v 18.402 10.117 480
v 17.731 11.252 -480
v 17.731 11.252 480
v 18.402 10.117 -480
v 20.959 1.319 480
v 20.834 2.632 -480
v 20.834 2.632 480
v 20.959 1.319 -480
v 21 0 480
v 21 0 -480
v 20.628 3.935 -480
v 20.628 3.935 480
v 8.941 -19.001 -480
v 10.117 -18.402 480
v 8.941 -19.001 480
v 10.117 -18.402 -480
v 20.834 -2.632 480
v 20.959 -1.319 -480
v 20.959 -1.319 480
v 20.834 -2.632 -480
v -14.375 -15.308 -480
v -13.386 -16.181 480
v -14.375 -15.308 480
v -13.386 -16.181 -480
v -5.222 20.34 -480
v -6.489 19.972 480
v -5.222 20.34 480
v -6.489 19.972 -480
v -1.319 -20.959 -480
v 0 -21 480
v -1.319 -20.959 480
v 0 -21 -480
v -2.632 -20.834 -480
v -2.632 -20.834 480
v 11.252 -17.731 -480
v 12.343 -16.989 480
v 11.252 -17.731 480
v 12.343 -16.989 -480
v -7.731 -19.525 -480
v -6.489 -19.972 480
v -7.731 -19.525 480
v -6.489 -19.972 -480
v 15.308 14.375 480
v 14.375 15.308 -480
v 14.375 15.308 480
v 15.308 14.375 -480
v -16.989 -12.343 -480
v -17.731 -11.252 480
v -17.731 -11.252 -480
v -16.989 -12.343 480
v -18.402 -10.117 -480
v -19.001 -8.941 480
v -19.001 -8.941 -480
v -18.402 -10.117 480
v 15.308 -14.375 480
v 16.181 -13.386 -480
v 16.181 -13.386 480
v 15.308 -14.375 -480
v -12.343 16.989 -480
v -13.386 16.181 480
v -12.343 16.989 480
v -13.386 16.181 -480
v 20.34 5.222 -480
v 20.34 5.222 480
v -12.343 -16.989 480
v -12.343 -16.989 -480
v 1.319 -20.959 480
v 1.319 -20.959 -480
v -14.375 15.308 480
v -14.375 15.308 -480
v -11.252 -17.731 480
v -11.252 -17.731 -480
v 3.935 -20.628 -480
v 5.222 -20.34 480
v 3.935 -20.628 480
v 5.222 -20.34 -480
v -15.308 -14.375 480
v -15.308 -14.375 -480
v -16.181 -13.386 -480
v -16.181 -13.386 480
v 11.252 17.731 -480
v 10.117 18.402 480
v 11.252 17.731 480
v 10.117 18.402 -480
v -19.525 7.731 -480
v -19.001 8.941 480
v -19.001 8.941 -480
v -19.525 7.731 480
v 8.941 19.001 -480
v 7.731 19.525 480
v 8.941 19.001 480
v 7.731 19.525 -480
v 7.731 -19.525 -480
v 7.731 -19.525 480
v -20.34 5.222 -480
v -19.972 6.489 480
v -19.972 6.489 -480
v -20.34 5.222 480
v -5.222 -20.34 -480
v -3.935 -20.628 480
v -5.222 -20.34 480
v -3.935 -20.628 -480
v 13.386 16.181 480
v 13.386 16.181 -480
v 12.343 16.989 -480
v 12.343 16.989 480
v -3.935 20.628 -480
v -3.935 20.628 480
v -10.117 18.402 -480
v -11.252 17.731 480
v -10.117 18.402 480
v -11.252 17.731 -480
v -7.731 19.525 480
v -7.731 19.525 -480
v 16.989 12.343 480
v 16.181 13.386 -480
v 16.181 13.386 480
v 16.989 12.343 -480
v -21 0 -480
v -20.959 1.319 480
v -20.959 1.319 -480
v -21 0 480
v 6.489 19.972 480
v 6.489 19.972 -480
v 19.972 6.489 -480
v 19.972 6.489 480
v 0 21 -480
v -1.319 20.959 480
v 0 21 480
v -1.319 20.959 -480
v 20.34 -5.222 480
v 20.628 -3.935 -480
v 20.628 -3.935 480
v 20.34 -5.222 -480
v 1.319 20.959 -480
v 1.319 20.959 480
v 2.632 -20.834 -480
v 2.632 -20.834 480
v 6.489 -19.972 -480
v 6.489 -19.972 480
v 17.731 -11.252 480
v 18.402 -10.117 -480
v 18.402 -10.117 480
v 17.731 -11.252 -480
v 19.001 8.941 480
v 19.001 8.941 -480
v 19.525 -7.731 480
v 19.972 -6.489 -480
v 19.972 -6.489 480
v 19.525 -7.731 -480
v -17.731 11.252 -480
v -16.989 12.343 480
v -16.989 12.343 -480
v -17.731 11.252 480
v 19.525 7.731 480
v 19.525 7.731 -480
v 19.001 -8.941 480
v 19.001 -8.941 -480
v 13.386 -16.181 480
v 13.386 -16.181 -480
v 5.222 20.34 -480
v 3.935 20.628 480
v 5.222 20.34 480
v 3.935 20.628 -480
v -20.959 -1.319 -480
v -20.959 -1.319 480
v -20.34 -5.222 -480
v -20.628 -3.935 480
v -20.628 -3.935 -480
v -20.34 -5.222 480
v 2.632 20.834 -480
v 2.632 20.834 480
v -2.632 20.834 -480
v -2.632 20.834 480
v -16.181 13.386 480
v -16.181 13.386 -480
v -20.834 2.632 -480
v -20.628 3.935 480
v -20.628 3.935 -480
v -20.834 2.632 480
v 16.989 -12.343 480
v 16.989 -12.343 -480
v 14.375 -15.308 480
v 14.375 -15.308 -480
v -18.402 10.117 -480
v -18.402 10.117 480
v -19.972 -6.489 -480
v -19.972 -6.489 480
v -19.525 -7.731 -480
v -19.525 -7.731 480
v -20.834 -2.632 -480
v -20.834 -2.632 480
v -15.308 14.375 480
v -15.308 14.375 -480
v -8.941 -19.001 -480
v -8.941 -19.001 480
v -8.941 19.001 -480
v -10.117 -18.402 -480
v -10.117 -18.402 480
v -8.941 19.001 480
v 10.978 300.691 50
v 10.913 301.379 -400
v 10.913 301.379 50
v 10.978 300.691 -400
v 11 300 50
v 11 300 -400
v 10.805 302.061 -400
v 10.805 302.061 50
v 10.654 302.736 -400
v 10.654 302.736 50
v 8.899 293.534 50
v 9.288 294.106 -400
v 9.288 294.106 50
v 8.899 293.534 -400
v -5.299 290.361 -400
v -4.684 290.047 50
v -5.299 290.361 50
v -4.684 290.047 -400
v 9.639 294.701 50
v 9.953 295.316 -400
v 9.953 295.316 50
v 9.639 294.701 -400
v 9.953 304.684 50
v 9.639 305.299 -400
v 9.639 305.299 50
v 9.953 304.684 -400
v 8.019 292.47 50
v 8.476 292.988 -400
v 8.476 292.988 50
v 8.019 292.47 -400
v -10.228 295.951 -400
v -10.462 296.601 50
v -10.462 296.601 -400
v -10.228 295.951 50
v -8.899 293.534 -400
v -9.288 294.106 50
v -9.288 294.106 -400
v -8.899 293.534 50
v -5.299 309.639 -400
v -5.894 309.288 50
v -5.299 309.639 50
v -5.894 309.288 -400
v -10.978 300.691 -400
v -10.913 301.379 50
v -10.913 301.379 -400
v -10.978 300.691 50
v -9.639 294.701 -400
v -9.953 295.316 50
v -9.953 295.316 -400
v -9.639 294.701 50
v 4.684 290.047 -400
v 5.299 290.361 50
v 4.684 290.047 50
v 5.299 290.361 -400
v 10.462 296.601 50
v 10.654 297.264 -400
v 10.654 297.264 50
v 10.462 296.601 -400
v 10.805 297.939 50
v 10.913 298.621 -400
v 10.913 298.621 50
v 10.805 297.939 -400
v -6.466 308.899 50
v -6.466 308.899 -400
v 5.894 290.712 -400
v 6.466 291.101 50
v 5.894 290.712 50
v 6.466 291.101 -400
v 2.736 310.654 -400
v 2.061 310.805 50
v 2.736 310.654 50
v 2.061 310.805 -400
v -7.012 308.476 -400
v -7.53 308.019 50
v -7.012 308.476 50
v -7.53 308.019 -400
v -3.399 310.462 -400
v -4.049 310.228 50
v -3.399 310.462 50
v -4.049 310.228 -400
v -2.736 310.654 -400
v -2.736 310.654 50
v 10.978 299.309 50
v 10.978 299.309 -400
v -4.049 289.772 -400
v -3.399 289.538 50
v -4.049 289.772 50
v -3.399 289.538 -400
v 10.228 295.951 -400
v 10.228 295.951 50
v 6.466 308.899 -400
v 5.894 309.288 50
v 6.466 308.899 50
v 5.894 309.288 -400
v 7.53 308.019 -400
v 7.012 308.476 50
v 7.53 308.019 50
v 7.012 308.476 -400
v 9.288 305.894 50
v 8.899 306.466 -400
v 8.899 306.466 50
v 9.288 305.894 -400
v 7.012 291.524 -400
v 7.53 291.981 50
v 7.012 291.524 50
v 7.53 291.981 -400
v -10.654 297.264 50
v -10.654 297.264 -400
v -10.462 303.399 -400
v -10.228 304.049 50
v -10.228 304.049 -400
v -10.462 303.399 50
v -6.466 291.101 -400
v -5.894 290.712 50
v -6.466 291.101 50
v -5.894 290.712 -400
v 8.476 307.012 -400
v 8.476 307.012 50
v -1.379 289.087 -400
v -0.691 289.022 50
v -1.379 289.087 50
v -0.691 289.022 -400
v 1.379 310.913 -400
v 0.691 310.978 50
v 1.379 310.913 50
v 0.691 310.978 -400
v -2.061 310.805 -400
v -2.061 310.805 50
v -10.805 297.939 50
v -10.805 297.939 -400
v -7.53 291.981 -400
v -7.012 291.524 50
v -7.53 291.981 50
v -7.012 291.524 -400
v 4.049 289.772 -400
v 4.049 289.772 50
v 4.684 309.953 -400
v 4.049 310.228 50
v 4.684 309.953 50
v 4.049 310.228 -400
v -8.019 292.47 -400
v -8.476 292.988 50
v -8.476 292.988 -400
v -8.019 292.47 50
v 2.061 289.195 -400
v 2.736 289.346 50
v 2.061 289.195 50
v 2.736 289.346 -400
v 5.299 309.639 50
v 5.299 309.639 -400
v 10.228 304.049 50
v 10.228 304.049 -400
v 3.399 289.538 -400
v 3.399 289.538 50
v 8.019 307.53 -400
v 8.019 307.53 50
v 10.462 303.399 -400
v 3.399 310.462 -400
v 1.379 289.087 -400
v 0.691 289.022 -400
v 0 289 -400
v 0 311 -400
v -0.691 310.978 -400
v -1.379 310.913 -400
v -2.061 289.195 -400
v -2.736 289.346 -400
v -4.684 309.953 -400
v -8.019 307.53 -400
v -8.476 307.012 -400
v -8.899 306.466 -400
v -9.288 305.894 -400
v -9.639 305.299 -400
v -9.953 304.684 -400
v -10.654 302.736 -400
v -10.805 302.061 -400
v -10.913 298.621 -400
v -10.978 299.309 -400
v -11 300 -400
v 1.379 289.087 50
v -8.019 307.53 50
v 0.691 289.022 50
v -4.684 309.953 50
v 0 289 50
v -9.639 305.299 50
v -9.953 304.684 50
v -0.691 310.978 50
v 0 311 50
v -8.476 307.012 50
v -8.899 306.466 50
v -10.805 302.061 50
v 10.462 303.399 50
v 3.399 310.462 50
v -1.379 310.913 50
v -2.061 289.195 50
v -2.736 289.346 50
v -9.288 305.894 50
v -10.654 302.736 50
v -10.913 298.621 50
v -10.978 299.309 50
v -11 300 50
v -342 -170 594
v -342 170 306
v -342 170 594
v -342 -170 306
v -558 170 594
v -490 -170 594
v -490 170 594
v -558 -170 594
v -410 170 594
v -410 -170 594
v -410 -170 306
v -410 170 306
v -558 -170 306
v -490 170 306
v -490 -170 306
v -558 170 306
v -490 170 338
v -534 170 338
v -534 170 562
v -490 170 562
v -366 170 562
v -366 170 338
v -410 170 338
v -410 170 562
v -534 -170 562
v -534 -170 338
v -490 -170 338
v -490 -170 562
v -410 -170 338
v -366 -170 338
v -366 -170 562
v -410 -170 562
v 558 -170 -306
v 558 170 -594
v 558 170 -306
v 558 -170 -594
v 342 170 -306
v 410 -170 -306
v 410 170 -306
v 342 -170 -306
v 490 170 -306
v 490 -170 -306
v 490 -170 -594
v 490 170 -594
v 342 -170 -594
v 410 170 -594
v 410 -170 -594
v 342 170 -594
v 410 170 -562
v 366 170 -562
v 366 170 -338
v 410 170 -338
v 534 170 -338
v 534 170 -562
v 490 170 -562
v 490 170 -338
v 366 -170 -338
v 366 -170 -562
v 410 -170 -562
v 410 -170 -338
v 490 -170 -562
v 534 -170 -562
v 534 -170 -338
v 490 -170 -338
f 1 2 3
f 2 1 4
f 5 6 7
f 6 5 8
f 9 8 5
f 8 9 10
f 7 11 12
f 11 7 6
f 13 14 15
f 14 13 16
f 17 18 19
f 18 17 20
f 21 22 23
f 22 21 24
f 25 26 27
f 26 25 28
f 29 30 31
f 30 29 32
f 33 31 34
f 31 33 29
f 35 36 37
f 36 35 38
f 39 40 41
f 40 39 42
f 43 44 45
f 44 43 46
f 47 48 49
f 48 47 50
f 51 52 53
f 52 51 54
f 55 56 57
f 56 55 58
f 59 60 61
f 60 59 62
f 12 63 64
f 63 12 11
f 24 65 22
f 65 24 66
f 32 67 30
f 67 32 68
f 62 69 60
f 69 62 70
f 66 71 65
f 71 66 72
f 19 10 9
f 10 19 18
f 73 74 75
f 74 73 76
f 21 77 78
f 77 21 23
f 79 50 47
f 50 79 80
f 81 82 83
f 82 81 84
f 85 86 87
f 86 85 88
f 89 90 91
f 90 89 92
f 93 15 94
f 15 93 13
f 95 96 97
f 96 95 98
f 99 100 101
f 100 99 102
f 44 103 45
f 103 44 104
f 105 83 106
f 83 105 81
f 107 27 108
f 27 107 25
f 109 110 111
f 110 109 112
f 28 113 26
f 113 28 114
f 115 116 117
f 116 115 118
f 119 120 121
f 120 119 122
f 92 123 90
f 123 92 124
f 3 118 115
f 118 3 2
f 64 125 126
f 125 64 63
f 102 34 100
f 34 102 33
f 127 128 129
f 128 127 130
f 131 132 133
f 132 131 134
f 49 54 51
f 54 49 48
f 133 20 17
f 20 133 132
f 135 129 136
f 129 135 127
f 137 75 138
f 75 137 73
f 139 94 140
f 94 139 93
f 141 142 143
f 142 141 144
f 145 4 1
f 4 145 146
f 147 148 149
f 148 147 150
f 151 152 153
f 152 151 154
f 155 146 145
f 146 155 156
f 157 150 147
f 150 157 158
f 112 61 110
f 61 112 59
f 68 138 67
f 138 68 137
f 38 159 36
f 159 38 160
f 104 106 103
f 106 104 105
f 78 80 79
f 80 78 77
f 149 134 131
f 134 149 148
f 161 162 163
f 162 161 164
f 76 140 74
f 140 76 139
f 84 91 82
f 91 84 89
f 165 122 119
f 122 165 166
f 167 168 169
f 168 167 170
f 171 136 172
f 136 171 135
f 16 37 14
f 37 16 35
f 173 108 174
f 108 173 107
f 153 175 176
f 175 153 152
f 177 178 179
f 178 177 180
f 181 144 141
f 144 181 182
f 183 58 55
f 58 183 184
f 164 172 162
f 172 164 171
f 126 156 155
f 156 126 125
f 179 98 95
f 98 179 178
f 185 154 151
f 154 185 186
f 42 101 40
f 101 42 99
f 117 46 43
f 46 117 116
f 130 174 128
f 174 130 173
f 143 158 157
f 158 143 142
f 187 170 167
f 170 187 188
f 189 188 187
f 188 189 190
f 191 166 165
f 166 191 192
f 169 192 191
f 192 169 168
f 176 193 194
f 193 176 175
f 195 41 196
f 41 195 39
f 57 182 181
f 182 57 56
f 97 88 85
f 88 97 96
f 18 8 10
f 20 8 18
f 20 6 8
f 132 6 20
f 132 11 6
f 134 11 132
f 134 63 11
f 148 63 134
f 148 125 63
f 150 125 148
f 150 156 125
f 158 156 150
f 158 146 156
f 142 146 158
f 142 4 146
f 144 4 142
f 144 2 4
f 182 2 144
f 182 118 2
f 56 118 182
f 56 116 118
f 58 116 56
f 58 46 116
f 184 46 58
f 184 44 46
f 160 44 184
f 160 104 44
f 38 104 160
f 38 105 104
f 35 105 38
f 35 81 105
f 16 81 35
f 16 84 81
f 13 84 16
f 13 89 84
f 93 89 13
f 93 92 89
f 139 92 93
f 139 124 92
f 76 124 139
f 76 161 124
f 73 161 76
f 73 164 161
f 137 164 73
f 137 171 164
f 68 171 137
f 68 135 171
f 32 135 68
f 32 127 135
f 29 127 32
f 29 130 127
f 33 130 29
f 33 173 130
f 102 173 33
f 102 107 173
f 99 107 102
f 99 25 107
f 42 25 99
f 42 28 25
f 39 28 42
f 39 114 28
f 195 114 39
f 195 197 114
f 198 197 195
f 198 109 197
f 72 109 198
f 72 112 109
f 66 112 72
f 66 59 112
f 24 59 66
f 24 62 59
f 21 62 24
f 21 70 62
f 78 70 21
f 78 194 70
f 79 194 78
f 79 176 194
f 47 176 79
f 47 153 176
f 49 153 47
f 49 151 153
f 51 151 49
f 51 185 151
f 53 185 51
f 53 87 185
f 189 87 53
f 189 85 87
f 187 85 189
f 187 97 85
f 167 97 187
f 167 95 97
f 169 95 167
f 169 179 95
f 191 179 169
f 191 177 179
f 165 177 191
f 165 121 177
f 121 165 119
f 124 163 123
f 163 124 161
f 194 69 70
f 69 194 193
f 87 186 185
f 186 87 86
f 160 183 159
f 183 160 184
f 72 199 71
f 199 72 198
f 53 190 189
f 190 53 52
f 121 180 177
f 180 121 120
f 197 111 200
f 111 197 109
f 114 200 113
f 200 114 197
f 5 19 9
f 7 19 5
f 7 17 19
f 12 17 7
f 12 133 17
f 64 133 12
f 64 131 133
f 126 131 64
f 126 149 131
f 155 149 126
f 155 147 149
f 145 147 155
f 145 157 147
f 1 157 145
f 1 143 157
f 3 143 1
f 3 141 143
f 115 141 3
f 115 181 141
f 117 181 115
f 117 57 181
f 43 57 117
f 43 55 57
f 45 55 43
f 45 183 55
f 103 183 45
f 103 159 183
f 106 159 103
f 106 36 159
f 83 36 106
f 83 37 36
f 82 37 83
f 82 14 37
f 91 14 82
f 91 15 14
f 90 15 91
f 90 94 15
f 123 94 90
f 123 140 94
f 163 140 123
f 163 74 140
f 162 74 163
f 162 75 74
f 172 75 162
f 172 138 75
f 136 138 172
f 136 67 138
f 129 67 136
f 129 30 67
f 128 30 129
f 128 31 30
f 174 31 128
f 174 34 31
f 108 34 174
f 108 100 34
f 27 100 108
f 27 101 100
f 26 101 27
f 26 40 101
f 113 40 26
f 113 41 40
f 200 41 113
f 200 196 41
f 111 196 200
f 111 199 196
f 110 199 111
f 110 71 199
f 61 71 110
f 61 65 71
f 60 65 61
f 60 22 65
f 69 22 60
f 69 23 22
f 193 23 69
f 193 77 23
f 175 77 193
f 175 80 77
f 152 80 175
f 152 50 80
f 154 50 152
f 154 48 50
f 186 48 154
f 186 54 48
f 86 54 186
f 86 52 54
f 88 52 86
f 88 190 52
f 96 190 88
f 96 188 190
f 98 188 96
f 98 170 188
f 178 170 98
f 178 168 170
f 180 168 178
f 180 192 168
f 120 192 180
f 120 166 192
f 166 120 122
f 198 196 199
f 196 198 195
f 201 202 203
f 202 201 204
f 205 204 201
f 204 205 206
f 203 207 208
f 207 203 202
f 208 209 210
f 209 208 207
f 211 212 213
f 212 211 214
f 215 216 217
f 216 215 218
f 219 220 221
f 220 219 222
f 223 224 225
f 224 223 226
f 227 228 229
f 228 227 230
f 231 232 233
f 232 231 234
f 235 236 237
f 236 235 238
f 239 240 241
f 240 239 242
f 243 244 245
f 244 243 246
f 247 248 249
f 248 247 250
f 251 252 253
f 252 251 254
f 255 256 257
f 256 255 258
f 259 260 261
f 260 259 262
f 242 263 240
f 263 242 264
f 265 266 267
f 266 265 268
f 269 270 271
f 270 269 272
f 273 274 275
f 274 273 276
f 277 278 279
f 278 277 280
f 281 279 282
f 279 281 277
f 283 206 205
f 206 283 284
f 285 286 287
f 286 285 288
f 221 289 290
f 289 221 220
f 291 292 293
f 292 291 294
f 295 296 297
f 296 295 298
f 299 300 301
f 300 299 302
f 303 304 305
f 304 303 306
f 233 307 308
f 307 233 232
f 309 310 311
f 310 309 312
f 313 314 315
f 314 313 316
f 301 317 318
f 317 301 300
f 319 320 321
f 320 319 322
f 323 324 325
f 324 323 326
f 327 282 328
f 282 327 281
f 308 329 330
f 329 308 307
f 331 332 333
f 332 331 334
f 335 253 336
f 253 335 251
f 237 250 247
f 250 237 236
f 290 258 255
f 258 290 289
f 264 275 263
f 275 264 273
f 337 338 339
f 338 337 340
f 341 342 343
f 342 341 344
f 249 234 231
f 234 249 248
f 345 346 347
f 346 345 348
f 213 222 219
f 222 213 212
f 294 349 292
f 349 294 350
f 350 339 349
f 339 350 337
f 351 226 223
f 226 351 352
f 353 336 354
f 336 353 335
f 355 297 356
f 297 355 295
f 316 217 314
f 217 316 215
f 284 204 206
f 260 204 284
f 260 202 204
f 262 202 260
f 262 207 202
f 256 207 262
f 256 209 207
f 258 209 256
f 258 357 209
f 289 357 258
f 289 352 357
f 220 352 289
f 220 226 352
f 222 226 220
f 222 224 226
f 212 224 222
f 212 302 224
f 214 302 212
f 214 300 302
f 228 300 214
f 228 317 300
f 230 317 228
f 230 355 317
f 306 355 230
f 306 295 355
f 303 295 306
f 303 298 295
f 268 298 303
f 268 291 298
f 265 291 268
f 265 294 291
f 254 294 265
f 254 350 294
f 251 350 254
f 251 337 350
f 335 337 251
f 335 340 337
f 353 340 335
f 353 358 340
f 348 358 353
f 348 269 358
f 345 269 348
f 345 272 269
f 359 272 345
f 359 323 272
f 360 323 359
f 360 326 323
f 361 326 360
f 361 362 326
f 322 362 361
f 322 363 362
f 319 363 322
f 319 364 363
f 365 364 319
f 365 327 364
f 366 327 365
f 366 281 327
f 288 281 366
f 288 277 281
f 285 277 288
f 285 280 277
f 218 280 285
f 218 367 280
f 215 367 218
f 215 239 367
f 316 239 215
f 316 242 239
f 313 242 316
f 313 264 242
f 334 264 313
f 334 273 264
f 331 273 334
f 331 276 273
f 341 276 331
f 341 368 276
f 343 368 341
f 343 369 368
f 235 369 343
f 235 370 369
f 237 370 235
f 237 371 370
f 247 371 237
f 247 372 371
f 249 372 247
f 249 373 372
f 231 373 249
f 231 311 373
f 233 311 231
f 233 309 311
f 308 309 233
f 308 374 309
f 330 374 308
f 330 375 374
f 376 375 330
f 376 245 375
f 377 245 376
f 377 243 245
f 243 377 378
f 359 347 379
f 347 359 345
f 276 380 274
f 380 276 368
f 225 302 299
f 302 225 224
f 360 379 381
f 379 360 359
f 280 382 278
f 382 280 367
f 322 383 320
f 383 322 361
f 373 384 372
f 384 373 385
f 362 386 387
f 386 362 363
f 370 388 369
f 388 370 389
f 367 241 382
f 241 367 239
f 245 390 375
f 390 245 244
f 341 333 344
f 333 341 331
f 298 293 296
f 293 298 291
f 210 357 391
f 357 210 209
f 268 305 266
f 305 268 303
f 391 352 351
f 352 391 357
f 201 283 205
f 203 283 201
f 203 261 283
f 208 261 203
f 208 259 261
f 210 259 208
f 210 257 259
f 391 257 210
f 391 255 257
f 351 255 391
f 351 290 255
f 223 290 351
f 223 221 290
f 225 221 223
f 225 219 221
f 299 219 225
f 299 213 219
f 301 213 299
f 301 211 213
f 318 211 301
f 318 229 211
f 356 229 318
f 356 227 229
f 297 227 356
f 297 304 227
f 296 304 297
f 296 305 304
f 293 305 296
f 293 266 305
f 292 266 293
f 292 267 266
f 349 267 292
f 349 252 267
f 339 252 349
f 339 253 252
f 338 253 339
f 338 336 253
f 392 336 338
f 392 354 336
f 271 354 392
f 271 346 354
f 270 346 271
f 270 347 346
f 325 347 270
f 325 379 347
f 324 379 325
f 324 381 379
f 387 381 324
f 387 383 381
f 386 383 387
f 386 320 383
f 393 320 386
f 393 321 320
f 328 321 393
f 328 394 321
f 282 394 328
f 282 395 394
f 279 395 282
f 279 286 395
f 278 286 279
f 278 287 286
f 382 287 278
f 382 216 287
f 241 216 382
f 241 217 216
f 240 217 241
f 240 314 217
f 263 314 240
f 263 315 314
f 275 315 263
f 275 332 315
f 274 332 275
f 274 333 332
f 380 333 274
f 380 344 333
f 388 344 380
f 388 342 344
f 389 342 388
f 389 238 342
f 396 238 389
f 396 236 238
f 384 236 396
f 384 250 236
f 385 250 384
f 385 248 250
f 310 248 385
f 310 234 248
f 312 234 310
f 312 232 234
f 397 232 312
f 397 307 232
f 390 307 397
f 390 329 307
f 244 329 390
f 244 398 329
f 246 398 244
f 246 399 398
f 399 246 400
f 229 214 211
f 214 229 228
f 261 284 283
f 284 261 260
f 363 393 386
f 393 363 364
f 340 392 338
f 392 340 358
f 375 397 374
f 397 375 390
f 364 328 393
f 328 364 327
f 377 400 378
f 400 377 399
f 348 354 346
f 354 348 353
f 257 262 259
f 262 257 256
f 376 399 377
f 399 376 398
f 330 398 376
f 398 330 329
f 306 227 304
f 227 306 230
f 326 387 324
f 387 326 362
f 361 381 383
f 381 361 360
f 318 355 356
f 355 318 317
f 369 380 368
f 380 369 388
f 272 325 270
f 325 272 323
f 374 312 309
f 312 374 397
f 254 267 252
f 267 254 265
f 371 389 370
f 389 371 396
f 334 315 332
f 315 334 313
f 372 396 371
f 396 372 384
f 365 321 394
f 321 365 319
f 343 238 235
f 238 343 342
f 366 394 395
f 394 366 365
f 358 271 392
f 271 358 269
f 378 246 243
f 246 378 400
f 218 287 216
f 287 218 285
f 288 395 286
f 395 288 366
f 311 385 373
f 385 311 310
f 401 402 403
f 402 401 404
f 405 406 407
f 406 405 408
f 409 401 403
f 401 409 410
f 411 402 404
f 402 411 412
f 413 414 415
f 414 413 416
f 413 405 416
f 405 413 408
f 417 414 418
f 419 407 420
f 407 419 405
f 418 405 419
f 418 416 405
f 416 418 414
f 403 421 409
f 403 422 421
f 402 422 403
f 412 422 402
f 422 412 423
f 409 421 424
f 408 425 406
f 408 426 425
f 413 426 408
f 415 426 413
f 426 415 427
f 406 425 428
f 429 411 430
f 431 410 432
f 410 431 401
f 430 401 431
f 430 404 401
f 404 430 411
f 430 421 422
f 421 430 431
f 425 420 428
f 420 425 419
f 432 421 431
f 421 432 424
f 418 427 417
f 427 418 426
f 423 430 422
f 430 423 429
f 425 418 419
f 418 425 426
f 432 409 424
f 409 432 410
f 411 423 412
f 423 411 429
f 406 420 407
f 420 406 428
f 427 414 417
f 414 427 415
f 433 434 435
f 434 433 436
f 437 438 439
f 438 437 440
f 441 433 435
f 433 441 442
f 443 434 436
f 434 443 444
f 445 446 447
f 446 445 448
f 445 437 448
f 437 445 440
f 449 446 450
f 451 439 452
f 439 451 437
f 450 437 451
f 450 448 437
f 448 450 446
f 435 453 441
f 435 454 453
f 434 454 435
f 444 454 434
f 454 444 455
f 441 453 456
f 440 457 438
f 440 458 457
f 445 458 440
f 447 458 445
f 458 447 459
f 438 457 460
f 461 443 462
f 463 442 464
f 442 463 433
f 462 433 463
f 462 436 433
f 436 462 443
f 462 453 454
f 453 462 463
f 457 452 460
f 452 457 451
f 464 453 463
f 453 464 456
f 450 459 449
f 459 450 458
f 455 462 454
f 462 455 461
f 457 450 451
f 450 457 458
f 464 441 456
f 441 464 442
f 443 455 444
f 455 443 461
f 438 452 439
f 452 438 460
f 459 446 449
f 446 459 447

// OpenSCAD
// ============================================================================
// PROJECT: XXXG-00W0 WING GUNDAM ZERO EW - WEAPON COMBINATION INFRA
// COMPONENT VAULT: BANDAI CAST RUNNER D - BARREL CLAMPS D5 & D6
// PACKAGING RE-ARCHITECTURE: SUB-ARMOR CAPACITOR RECESSED BANK INTEGRATION
// CONFIG METRIC: SCALED TITANIUM CASTS (1:1 ACTUAL METRIC UP-SCALE)
// ============================================================================

$fn = 100; // Circular segment rendering resolution count

// Structural Constants Scaled 1:1 for a 16.7-Meter Airframe Scale (mm)
clamp_total_length = 640;                // Total longitudinal vertical height (mm)
clamp_outer_diameter = 480;              // Transverse weapon spine bounding width (mm)
armor_skin_thickness = 50;              // Solid TiAl protective plating wall (mm)
harness_conduit_width = 80;             // Cast-in 4oz copper logic trace track (mm)
capacitor_pocket_depth = 15;            // Sub-armor recessed housing pocket depth (mm)
capacitor_pocket_width = 140;           // Transverse MLCC array pocket width (mm)

module Runner_D_Barrel_Clamp_Forge() {
    // Central Supply Injection Runner Axis (Molten Feed Line from Siphon Forge)
    color([0.25, 0.25, 0.28]) {
        cylinder(h = clamp_total_length * 1.5, d = 42, center = true);
        // Direct injection gates tracking straight into the part mold cavities
        translate() rotate() cylinder(h = 450, d = 22);
        translate([0, 300, -400]) rotate() cylinder(h = 450, d = 22);
    }
    
    // Instantiate Scaled Skeutomorphic Part Molds Symmetrically (Left & Right)
    Cast_Internal_Barrel_Clamps();
}

module Cast_Internal_Barrel_Clamps() {
    // ---- PART D5: INTERNAL LEFT BARREL CROSS-AXIS ALIGNMENT CLAMP ---- [Page 23, Step 14-2]
    translate([-450, 0, 450]) color([0.5, 0.5, 0.55]) { // Weapon Metallic Casing Spec
        difference() {
            // Main solid heavy-duty interlocking block segment
            cube([clamp_outer_diameter * 0.45, 340, clamp_total_length * 0.45], center = true);
            
            // Core structural alignment cutout (Fits securely over the main weapon rail)
            cube([clamp_outer_diameter * 0.35, 360, clamp_total_length * 0.35], center = true);
            
            // SUB-ARMOR RECESSED CAPACITOR POCKETS [Segmented rows cut inside the anchor wall]
            for (z_offset = [-150, 0, 150]) {
                translate([(clamp_outer_diameter * 0.15 - armor_skin_thickness + capacitor_pocket_depth/2), 0, z_offset])
                    cube([capacitor_pocket_depth, capacitor_pocket_width, 100], center = true);
            }
            
            // Continuous cast-in routing track for the 4oz solid-state wiring rails
            cube([harness_conduit_width, 360, clamp_total_length], center = true);
        }
    }
    
    // ---- PART D6: INTERNAL RIGHT BARREL CROSS-AXIS ALIGNMENT CLAMP ---- [Page 23, Step 14-2]
    translate([450, 0, -450]) rotate() color([0.5, 0.5, 0.55]) {
        difference() {
            cube([clamp_outer_diameter * 0.45, 340, clamp_total_length * 0.45], center = true);
            cube([clamp_outer_diameter * 0.35, 360, clamp_total_length * 0.35], center = true);
            
            for (z_offset = [-150, 0, 150]) {
                translate([(clamp_outer_diameter * 0.15 - armor_skin_thickness + capacitor_pocket_depth/2), 0, z_offset])
                    cube([capacitor_pocket_depth, capacitor_pocket_width, 100], center = true);
            }
            
            cube([harness_conduit_width, 360, clamp_total_length], center = true);
        }
    }
}

// Render Master Assembly to Parameter Workspace
Runner_D_Barrel_Clamp_Forge();
